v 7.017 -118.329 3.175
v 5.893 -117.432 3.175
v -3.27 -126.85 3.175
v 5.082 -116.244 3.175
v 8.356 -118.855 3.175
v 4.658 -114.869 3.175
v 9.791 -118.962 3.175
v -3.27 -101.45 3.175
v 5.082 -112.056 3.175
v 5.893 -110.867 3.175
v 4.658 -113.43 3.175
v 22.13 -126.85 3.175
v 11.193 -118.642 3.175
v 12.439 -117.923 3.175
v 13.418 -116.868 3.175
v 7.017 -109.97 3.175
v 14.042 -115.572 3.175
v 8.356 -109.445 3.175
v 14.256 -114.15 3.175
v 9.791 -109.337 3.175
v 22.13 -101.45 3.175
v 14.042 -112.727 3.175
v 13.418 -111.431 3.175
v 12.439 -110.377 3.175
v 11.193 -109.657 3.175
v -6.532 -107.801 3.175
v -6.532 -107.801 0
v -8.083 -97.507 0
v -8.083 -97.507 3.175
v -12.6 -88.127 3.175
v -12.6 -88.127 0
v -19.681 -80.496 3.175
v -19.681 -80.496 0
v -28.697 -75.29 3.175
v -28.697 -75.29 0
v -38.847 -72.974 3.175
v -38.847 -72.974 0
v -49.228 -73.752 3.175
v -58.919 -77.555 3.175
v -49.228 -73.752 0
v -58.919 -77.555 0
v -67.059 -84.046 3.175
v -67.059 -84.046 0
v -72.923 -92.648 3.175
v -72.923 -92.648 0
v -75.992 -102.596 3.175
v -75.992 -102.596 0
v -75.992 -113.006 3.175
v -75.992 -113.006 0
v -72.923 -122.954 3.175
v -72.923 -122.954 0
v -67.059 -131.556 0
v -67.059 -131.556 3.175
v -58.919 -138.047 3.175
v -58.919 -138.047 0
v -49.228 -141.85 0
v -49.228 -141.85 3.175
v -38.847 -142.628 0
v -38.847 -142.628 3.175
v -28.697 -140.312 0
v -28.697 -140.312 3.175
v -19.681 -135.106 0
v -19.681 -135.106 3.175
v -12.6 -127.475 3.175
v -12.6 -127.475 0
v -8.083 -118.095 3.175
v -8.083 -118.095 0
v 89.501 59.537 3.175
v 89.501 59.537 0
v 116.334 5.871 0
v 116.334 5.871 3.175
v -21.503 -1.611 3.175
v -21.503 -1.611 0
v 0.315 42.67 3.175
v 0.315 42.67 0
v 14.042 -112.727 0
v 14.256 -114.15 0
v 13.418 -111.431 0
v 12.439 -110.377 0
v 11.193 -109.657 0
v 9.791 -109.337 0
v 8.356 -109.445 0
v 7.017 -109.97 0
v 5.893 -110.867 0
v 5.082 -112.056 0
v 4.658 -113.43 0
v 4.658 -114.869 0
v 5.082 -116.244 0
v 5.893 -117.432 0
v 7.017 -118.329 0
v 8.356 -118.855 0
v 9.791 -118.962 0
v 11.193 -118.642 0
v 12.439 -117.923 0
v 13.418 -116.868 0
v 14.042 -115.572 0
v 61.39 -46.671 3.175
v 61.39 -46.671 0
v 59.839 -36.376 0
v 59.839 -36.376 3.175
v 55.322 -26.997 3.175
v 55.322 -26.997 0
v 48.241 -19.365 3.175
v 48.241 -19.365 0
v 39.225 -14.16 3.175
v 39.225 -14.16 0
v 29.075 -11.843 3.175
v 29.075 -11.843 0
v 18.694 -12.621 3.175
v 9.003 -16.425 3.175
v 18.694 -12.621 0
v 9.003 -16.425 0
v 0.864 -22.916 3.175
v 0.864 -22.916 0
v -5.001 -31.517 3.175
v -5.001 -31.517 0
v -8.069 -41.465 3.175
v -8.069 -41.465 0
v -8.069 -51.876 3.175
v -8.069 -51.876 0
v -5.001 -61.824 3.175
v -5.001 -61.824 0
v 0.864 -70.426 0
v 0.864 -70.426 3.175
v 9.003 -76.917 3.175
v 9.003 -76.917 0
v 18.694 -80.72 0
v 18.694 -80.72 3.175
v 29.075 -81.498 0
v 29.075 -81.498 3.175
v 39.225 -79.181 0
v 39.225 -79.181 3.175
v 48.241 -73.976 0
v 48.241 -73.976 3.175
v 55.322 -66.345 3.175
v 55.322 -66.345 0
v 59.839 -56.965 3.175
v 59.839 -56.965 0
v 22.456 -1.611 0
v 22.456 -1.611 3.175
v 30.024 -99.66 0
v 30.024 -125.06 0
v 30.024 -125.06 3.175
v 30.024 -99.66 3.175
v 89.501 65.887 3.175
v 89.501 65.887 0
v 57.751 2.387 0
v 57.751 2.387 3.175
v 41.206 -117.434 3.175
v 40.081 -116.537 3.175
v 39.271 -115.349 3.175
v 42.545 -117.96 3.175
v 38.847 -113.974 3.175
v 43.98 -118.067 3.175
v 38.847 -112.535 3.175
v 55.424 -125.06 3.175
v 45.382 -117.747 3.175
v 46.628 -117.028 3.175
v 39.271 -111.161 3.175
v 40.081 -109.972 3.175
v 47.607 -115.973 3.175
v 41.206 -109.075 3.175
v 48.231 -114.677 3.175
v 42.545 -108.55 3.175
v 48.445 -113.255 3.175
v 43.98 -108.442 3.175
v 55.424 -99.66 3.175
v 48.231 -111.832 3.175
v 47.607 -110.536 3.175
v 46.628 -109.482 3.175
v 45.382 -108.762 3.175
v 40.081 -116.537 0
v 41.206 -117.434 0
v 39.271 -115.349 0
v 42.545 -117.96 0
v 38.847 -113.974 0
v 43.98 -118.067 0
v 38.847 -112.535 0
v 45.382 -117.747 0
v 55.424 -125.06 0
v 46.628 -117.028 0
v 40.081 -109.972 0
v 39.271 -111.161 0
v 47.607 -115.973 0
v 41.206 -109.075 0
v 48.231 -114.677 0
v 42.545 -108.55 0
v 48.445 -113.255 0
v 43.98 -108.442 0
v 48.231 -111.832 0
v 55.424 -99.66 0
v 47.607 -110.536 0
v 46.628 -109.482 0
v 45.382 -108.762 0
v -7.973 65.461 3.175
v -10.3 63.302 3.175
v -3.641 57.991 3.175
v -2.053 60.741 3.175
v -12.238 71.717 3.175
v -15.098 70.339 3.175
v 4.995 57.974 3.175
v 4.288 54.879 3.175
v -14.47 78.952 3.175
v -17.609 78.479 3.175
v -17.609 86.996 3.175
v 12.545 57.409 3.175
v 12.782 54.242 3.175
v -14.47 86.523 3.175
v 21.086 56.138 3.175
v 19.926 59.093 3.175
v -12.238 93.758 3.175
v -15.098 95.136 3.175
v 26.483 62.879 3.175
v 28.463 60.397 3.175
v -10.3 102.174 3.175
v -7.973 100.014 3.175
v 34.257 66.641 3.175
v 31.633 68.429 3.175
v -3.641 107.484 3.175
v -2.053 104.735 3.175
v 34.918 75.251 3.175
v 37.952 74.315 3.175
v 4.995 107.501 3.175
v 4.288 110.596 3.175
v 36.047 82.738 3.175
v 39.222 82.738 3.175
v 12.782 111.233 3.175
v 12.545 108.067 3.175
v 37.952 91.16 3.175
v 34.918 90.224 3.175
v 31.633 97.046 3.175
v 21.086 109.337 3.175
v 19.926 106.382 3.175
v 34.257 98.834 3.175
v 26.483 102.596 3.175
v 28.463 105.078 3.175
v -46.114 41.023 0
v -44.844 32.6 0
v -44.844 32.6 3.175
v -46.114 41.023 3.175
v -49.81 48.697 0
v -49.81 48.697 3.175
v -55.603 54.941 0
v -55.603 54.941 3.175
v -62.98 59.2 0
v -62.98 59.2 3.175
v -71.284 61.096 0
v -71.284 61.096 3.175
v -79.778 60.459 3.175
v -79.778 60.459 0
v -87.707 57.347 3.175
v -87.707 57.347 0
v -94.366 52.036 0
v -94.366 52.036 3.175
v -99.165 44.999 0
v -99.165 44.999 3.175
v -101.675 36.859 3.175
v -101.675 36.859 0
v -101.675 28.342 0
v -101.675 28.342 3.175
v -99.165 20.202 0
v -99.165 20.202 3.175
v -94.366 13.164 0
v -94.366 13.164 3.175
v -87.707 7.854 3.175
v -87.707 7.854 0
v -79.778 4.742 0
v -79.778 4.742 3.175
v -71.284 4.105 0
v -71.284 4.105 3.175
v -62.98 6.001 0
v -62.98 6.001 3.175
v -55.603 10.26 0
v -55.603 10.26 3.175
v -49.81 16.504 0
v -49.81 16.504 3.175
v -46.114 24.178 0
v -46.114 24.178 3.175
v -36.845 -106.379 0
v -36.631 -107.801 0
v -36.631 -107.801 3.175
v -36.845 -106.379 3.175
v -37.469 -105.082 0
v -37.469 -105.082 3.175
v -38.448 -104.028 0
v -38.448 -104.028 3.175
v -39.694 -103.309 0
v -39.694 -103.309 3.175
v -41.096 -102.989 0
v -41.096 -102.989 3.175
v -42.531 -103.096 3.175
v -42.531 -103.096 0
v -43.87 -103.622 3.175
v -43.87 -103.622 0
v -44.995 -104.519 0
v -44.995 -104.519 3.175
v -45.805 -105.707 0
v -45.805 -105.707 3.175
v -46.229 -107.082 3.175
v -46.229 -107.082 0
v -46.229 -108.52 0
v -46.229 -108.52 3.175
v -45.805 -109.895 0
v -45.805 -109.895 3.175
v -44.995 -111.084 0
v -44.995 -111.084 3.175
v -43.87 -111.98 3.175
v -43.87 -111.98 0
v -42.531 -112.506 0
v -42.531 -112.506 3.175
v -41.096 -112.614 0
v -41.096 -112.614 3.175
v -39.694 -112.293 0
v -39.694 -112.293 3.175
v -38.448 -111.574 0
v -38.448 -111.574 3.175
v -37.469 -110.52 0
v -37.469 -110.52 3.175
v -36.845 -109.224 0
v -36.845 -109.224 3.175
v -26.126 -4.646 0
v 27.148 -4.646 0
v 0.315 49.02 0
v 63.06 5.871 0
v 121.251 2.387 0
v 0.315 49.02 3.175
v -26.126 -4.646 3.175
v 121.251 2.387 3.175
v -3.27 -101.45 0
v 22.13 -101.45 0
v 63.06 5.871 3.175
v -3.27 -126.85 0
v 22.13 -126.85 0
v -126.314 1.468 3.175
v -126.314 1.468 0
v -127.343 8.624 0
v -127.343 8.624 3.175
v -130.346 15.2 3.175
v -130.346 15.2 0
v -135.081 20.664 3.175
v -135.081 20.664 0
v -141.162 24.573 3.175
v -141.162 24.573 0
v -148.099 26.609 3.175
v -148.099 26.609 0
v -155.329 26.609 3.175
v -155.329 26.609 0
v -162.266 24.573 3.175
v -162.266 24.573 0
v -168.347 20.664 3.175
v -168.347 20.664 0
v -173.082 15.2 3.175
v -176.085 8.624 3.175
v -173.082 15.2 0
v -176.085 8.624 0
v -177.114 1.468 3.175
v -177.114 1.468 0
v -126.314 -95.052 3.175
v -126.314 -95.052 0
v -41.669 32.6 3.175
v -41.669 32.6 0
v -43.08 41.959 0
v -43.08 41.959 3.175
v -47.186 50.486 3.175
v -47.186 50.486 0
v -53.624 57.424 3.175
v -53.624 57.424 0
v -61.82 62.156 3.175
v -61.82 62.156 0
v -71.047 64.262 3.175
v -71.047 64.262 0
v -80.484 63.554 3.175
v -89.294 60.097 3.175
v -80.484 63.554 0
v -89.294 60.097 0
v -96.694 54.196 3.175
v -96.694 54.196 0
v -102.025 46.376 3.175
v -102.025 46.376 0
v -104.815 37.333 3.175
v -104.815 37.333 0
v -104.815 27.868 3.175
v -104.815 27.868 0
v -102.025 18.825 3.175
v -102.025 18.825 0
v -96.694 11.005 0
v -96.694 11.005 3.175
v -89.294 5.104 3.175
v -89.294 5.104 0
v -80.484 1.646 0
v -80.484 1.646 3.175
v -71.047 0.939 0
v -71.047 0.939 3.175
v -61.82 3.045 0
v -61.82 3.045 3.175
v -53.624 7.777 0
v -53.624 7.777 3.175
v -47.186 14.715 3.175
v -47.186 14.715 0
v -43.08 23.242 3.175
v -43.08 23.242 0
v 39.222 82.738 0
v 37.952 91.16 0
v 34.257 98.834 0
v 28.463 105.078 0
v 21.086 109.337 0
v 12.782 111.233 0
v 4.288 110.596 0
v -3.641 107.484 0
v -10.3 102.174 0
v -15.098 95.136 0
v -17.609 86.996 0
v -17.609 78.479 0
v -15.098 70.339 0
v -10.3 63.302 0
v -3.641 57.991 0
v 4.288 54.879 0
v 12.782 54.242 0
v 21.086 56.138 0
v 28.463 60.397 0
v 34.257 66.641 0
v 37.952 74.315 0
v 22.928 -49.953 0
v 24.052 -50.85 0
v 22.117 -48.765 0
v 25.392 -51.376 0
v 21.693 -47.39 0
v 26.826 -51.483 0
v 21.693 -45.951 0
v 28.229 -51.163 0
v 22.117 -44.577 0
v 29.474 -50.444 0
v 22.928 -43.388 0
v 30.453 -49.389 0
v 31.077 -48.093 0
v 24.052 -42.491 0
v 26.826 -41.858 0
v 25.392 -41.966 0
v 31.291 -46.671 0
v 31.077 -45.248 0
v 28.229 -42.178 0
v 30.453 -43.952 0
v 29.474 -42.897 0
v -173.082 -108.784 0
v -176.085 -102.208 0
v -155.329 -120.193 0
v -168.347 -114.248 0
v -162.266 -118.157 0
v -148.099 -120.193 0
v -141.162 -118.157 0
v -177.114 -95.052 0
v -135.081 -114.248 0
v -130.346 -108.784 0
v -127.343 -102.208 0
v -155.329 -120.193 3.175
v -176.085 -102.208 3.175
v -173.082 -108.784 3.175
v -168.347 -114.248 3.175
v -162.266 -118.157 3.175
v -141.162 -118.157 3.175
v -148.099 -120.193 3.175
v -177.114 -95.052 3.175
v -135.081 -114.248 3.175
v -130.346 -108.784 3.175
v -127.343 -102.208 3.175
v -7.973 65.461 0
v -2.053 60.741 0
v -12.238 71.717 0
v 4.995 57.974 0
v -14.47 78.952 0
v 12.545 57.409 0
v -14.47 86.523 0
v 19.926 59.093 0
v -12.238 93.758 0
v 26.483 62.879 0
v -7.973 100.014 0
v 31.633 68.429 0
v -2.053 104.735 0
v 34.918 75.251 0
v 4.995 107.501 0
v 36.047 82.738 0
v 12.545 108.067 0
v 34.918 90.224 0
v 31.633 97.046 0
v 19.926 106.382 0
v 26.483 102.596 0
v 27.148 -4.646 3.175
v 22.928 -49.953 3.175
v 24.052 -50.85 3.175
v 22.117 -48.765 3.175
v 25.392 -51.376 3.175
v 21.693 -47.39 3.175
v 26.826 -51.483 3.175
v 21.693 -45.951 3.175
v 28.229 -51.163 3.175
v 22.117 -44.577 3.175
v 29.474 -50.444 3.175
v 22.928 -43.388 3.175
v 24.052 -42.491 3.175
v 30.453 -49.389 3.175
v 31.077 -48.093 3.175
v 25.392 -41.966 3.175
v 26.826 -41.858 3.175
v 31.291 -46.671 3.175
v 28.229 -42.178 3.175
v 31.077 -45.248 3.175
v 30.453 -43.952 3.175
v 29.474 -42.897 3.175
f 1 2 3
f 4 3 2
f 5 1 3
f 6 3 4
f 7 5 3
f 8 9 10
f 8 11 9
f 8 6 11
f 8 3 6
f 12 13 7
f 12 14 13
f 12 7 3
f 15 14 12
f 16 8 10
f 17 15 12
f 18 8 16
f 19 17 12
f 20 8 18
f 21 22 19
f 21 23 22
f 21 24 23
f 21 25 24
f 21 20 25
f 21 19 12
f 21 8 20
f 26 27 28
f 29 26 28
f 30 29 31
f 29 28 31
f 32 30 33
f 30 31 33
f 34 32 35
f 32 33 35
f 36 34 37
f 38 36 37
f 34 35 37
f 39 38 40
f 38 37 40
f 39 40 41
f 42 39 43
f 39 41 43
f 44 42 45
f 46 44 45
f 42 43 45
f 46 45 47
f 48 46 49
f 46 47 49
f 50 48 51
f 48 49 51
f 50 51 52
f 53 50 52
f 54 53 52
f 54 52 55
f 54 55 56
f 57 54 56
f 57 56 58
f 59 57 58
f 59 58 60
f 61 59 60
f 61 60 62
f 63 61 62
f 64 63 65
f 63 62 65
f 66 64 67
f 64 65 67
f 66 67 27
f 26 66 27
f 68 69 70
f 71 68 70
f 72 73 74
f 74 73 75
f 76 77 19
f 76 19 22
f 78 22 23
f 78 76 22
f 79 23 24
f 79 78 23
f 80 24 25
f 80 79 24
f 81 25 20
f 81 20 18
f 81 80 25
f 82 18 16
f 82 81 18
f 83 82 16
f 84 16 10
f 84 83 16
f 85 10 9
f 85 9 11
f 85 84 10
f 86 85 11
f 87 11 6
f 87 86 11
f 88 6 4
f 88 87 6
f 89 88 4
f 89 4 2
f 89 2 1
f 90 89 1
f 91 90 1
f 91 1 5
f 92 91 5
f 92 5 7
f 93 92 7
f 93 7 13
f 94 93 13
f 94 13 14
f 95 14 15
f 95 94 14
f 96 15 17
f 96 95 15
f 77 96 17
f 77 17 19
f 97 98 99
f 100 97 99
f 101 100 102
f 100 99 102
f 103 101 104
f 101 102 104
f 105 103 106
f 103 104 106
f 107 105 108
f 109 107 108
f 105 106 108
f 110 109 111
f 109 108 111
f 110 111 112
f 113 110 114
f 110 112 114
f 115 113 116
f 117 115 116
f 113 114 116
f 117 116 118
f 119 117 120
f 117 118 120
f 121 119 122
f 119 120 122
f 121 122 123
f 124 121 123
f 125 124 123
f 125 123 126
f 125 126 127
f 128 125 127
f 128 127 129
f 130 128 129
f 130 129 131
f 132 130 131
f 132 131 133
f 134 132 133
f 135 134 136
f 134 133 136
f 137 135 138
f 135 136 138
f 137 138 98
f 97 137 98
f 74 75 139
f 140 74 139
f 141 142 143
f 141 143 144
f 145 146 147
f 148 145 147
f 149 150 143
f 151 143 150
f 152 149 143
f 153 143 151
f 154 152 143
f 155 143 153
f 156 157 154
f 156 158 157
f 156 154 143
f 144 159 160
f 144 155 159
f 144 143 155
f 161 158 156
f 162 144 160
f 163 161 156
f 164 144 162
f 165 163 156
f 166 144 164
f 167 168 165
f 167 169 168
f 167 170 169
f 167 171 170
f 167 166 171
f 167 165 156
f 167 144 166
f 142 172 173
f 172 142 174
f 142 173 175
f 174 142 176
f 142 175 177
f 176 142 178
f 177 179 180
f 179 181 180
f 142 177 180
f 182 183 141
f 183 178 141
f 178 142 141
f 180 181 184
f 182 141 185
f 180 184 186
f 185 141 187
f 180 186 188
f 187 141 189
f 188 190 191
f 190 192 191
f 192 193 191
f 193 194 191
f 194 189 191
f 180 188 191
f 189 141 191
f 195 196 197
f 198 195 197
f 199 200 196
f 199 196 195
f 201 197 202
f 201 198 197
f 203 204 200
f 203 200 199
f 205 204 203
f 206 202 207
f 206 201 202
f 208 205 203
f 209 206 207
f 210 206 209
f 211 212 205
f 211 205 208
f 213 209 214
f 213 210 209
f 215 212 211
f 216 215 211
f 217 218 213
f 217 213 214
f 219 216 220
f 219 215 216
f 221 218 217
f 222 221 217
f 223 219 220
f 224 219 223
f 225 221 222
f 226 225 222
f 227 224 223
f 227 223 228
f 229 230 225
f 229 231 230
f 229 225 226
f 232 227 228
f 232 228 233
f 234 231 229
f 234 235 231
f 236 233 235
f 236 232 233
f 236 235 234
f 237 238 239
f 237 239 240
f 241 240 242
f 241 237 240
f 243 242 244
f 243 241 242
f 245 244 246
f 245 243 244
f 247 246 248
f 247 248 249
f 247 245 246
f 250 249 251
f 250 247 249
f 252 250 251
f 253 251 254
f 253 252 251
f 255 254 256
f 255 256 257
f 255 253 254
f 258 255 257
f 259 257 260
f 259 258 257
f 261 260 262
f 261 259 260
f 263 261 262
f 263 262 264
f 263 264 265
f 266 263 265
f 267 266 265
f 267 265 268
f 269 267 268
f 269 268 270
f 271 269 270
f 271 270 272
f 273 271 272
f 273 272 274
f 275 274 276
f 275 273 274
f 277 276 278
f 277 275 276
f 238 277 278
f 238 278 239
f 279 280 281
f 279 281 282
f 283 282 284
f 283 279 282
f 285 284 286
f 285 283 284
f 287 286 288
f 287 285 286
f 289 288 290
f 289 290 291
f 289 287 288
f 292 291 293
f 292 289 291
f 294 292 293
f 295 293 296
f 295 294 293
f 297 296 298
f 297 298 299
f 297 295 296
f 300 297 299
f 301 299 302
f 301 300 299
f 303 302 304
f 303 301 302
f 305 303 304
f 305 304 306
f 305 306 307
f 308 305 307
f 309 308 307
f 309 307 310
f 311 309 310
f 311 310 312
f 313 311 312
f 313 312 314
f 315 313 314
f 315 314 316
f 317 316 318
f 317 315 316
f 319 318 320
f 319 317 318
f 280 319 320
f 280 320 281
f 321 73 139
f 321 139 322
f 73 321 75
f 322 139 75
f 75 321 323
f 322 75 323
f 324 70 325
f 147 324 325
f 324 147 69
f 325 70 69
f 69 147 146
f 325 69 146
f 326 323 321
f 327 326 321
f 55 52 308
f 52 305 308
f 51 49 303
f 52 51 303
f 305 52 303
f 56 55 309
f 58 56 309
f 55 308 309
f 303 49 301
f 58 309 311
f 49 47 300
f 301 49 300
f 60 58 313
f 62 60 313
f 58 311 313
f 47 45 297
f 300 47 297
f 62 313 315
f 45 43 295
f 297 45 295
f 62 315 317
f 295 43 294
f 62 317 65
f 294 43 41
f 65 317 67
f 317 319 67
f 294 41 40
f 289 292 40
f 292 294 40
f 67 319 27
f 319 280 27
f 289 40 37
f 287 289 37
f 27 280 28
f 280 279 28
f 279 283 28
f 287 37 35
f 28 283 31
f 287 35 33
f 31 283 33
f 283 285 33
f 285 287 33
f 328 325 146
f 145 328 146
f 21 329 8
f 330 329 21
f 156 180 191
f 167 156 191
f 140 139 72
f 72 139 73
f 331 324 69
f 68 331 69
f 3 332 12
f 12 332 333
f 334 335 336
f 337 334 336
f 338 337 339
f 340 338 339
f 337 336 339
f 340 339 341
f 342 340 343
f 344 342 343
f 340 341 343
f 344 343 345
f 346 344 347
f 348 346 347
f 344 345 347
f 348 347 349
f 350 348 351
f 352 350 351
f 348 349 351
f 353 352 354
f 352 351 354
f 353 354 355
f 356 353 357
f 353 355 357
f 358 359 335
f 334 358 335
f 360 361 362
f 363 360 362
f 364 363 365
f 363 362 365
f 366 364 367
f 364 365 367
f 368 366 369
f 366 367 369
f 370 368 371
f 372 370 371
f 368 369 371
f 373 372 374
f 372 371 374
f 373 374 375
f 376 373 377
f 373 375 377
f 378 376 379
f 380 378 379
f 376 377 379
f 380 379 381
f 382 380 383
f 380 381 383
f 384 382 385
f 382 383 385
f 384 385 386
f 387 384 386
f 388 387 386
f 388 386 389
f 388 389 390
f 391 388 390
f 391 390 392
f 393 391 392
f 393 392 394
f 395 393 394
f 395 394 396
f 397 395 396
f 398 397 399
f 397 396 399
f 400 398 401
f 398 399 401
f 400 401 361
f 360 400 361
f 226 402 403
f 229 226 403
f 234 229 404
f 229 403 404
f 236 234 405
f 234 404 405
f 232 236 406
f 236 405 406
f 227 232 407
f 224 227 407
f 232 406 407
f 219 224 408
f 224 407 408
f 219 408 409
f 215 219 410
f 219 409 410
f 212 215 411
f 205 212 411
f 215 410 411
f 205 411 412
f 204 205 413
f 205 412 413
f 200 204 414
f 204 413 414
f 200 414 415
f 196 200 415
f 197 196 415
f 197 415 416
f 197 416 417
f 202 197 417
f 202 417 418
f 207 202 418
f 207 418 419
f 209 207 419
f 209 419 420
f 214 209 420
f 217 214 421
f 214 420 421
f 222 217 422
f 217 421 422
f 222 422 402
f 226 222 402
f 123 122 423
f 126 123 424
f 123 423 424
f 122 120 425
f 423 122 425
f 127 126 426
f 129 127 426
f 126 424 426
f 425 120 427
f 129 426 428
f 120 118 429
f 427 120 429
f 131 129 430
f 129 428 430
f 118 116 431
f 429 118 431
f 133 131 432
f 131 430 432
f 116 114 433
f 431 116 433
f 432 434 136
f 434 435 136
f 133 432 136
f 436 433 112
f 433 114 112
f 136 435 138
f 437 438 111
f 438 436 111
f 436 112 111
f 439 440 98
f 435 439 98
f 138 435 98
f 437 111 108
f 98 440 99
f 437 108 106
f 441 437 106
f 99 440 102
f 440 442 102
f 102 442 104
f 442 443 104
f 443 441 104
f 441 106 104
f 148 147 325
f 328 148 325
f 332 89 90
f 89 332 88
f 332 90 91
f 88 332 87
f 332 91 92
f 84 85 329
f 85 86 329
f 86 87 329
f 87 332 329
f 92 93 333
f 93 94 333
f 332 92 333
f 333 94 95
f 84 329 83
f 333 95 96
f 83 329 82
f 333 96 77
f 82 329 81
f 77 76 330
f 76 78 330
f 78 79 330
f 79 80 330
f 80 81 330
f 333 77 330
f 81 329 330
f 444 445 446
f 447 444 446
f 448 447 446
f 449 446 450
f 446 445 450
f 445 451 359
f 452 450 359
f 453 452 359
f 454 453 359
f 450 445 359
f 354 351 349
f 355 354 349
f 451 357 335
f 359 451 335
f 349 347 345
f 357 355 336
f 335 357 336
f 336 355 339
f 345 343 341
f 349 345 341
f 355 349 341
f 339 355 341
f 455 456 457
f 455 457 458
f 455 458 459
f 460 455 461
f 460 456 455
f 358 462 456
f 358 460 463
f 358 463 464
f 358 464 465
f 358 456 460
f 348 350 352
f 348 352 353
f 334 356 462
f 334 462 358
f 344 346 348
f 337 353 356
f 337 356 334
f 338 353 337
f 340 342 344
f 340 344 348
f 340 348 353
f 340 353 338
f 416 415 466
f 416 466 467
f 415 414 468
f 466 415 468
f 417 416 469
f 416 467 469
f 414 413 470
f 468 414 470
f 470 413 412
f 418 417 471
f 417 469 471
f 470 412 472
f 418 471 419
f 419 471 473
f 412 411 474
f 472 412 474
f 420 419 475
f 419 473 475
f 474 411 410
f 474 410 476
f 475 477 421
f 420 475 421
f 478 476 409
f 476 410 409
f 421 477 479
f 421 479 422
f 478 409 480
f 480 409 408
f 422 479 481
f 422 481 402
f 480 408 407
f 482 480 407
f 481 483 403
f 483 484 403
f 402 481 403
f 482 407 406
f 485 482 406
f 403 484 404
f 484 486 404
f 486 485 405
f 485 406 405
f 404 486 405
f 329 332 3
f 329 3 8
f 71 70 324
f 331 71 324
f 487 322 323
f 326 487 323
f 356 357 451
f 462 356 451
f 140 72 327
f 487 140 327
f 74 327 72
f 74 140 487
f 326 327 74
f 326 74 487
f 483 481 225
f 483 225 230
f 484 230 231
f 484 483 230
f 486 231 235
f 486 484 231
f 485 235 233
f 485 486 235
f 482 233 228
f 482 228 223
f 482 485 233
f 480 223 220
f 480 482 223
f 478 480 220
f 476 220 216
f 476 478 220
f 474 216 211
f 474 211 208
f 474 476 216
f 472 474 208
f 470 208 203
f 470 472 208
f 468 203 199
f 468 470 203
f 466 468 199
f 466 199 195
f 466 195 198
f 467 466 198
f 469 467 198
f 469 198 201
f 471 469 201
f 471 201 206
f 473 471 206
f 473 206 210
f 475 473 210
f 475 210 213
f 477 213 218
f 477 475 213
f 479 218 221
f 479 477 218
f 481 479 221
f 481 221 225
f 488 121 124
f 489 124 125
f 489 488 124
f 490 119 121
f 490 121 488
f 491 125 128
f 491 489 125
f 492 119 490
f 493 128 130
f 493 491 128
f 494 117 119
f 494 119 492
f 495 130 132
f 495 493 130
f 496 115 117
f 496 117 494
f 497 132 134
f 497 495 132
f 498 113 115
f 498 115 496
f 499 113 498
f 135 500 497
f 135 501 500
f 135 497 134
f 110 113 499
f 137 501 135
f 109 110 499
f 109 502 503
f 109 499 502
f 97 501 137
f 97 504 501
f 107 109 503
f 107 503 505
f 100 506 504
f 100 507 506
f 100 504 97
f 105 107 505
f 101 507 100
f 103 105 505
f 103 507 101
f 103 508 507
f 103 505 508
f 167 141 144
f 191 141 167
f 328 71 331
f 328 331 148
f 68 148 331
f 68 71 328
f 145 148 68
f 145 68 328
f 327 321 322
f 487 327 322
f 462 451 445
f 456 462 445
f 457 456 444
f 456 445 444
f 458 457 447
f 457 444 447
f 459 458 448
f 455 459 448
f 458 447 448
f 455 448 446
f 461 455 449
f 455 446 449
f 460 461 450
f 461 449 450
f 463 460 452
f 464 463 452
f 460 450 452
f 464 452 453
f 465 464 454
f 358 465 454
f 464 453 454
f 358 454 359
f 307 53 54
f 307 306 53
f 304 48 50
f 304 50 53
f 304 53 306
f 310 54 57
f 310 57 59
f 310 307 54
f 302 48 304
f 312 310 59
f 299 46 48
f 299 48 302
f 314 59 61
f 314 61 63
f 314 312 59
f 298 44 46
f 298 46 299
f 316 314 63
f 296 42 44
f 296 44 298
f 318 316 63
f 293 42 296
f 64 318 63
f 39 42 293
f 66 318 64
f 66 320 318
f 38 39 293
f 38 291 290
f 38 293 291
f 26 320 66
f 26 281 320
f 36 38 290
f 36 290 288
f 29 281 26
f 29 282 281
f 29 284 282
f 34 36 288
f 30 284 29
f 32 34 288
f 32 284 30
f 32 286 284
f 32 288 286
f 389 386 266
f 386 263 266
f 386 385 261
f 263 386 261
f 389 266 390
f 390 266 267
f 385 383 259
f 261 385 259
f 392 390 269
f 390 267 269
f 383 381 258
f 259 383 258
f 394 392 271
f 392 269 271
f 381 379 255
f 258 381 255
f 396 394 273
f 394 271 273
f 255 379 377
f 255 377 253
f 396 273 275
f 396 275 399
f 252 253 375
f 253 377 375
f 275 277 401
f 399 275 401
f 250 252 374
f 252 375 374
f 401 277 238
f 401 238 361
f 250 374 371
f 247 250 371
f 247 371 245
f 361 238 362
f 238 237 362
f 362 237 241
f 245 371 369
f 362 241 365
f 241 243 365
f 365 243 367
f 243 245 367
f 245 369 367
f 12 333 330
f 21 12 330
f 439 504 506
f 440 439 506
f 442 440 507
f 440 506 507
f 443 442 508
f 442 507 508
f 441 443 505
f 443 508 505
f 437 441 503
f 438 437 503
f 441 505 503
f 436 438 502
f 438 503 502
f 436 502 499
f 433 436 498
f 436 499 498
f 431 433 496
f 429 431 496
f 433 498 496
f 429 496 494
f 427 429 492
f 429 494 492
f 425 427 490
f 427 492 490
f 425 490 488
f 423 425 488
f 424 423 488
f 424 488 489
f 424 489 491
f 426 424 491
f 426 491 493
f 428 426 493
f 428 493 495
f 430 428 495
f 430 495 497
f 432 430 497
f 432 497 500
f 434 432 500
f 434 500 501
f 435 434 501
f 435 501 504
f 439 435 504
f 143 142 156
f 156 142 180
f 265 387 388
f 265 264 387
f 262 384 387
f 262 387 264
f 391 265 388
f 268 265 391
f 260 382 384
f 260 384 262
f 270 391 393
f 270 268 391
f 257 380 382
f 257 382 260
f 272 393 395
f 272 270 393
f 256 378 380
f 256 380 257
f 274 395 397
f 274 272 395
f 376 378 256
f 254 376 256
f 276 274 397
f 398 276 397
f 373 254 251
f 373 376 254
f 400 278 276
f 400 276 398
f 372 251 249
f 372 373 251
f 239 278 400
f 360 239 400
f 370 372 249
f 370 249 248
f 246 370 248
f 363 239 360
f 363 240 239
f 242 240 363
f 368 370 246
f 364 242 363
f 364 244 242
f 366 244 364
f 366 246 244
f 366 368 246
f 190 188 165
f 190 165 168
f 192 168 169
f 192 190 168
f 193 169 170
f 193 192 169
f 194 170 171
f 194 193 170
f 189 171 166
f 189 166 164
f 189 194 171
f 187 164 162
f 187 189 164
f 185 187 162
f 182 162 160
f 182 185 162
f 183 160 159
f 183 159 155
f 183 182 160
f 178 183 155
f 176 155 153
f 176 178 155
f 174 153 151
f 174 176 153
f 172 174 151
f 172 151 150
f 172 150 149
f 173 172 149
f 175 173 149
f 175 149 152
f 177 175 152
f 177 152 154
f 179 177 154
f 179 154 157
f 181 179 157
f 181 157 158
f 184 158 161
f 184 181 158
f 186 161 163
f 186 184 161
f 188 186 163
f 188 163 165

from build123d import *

# Parameters (mm, degrees)
F1_R      = 34.925
F1_R_2    = 4.826
F2_DEPTH  = 3.175
F3_R      = 34.925
F4_DEPTH  = 3.175
F5_R      = 4.826
F6_DEPTH  = 25.4
F7_W      = 25.4
F7_H      = 25.4
F7_R      = 4.826
F8_DEPTH  = 3.175
F0_R      = 31.75
F0_R_2    = 28.575
F9_DEPTH  = 3.175
F11_DEPTH = 3.175
F13_DEPTH = 3.175
F14_R     = 28.575
F14_R_2   = 25.4
F15_DEPTH = 3.175


# Not quite as in the source:
# - a feature names something its author has since deleted; it is built from what else it names


with BuildPart() as f2:
    # F1 (on Top) → F2 (new body)
    with BuildSketch(Plane.XY):
        with Locations((-41.45681113, -107.801027596)):
            Circle(F1_R)
        with Locations((-41.45681113, -107.801027596)):
            Circle(F1_R_2, mode=Mode.SUBTRACT)
    extrude(amount=F2_DEPTH)


with BuildPart() as f4:
    # F3 (on Top) → F4 (new body)
    with BuildSketch(Plane.XY):
        with Locations((26.4654487837, -46.6705858707)):
            Circle(F3_R)
    extrude(amount=F4_DEPTH)

    # F5 (on face) → F6 (cut)
    with BuildSketch(Plane.XY.offset(3.175)):
        with Locations((26.4654487837, -46.6705858707)):
            Circle(F5_R)
    extrude(amount=-F6_DEPTH, mode=Mode.SUBTRACT)


with BuildPart() as f8:
    # F7 (on Top) → F8 (new body)
    with BuildSketch(Plane.XY):
        with Locations((9.4302088464, -114.1496481273)):
            Rectangle(F7_W, F7_H)
        with Locations((9.4302088464, -114.1496481273)):
            Circle(F7_R, mode=Mode.SUBTRACT)
    extrude(amount=F8_DEPTH)


with BuildPart() as f8b:
    # F7 (on Top) → F8, piece 2 (new body)
    with BuildSketch(Plane.XY):
        with Locations((42.7242840971, -112.3598849141)):
            Rectangle(F7_W, F7_H)
        with Locations((43.6191657037, -113.2547665207)):
            Circle(F7_R, mode=Mode.SUBTRACT)
    extrude(amount=F8_DEPTH)


with BuildPart() as f9:
    # F0 (on Top) → F9 (new body)
    with BuildSketch(Plane.XY):
        with Locations((-73.4194368124, 32.6004140079)):
            Circle(F0_R)
        with Locations((-73.4194368124, 32.6004140079)):
            Circle(F0_R_2, mode=Mode.SUBTRACT)
    extrude(amount=F9_DEPTH)


with BuildPart() as f9b:
    # F0 (on Top) → F9, piece 2 (new body)
    with BuildSketch(Plane.XY):
        Polygon((89.5012710243, 65.8874005459), (57.7512710243, 2.3874005459), (121.2512710243, 2.3874005459), align=None)
        Polygon((116.3342488013, 5.871444992), (63.0601253544, 5.871444992), (89.5012710243, 59.5374005459), align=None, mode=Mode.SUBTRACT)
    extrude(amount=F9_DEPTH)


with BuildPart() as f11:
    # F10 (on Top) → F11 (new body)
    with BuildSketch(Plane.XY):
        with BuildLine():
            Line((-126.3140311956, -95.0520038605), (-126.3140311956, 1.4679961395))
            ThreePointArc((-126.3140311956, 1.4679961395), (-151.7140311956, 26.8679961395), (-177.1140311956, 1.4679961395))
            Line((-177.1140311956, 1.4679961395), (-177.1140311956, -95.0520038605))
            ThreePointArc((-177.1140311956, -95.0520038605), (-151.7140311956, -120.4520038605), (-126.3140311956, -95.0520038605))
        make_face()
    extrude(amount=F11_DEPTH)


with BuildPart() as f13:
    # F12 (on Top) → F13 (new body)
    with BuildSketch(Plane.XY):
        Polygon((0.3149577829, 49.0201465513), (-26.1261878871, -4.6458090026), (27.1479355598, -4.6458090026), align=None)
        Polygon((-21.5025167309, -1.6114300556), (0.3149577829, 42.6701465513), (22.4557460863, -1.6114300556), align=None, mode=Mode.SUBTRACT)
    extrude(amount=F13_DEPTH)


with BuildPart() as f15:
    # F14 (on Top) → F15 (new body)
    with BuildSketch(Plane.XY):
        with Locations((10.6468005106, 82.7375650406)):
            Circle(F14_R)
        with Locations((10.6468005106, 82.7375650406)):
            Circle(F14_R_2, mode=Mode.SUBTRACT)
    extrude(amount=F15_DEPTH)


solid = Compound([f2.part, f4.part, f8.part, f8b.part, f9.part, f9b.part, f11.part, f13.part, f15.part])
